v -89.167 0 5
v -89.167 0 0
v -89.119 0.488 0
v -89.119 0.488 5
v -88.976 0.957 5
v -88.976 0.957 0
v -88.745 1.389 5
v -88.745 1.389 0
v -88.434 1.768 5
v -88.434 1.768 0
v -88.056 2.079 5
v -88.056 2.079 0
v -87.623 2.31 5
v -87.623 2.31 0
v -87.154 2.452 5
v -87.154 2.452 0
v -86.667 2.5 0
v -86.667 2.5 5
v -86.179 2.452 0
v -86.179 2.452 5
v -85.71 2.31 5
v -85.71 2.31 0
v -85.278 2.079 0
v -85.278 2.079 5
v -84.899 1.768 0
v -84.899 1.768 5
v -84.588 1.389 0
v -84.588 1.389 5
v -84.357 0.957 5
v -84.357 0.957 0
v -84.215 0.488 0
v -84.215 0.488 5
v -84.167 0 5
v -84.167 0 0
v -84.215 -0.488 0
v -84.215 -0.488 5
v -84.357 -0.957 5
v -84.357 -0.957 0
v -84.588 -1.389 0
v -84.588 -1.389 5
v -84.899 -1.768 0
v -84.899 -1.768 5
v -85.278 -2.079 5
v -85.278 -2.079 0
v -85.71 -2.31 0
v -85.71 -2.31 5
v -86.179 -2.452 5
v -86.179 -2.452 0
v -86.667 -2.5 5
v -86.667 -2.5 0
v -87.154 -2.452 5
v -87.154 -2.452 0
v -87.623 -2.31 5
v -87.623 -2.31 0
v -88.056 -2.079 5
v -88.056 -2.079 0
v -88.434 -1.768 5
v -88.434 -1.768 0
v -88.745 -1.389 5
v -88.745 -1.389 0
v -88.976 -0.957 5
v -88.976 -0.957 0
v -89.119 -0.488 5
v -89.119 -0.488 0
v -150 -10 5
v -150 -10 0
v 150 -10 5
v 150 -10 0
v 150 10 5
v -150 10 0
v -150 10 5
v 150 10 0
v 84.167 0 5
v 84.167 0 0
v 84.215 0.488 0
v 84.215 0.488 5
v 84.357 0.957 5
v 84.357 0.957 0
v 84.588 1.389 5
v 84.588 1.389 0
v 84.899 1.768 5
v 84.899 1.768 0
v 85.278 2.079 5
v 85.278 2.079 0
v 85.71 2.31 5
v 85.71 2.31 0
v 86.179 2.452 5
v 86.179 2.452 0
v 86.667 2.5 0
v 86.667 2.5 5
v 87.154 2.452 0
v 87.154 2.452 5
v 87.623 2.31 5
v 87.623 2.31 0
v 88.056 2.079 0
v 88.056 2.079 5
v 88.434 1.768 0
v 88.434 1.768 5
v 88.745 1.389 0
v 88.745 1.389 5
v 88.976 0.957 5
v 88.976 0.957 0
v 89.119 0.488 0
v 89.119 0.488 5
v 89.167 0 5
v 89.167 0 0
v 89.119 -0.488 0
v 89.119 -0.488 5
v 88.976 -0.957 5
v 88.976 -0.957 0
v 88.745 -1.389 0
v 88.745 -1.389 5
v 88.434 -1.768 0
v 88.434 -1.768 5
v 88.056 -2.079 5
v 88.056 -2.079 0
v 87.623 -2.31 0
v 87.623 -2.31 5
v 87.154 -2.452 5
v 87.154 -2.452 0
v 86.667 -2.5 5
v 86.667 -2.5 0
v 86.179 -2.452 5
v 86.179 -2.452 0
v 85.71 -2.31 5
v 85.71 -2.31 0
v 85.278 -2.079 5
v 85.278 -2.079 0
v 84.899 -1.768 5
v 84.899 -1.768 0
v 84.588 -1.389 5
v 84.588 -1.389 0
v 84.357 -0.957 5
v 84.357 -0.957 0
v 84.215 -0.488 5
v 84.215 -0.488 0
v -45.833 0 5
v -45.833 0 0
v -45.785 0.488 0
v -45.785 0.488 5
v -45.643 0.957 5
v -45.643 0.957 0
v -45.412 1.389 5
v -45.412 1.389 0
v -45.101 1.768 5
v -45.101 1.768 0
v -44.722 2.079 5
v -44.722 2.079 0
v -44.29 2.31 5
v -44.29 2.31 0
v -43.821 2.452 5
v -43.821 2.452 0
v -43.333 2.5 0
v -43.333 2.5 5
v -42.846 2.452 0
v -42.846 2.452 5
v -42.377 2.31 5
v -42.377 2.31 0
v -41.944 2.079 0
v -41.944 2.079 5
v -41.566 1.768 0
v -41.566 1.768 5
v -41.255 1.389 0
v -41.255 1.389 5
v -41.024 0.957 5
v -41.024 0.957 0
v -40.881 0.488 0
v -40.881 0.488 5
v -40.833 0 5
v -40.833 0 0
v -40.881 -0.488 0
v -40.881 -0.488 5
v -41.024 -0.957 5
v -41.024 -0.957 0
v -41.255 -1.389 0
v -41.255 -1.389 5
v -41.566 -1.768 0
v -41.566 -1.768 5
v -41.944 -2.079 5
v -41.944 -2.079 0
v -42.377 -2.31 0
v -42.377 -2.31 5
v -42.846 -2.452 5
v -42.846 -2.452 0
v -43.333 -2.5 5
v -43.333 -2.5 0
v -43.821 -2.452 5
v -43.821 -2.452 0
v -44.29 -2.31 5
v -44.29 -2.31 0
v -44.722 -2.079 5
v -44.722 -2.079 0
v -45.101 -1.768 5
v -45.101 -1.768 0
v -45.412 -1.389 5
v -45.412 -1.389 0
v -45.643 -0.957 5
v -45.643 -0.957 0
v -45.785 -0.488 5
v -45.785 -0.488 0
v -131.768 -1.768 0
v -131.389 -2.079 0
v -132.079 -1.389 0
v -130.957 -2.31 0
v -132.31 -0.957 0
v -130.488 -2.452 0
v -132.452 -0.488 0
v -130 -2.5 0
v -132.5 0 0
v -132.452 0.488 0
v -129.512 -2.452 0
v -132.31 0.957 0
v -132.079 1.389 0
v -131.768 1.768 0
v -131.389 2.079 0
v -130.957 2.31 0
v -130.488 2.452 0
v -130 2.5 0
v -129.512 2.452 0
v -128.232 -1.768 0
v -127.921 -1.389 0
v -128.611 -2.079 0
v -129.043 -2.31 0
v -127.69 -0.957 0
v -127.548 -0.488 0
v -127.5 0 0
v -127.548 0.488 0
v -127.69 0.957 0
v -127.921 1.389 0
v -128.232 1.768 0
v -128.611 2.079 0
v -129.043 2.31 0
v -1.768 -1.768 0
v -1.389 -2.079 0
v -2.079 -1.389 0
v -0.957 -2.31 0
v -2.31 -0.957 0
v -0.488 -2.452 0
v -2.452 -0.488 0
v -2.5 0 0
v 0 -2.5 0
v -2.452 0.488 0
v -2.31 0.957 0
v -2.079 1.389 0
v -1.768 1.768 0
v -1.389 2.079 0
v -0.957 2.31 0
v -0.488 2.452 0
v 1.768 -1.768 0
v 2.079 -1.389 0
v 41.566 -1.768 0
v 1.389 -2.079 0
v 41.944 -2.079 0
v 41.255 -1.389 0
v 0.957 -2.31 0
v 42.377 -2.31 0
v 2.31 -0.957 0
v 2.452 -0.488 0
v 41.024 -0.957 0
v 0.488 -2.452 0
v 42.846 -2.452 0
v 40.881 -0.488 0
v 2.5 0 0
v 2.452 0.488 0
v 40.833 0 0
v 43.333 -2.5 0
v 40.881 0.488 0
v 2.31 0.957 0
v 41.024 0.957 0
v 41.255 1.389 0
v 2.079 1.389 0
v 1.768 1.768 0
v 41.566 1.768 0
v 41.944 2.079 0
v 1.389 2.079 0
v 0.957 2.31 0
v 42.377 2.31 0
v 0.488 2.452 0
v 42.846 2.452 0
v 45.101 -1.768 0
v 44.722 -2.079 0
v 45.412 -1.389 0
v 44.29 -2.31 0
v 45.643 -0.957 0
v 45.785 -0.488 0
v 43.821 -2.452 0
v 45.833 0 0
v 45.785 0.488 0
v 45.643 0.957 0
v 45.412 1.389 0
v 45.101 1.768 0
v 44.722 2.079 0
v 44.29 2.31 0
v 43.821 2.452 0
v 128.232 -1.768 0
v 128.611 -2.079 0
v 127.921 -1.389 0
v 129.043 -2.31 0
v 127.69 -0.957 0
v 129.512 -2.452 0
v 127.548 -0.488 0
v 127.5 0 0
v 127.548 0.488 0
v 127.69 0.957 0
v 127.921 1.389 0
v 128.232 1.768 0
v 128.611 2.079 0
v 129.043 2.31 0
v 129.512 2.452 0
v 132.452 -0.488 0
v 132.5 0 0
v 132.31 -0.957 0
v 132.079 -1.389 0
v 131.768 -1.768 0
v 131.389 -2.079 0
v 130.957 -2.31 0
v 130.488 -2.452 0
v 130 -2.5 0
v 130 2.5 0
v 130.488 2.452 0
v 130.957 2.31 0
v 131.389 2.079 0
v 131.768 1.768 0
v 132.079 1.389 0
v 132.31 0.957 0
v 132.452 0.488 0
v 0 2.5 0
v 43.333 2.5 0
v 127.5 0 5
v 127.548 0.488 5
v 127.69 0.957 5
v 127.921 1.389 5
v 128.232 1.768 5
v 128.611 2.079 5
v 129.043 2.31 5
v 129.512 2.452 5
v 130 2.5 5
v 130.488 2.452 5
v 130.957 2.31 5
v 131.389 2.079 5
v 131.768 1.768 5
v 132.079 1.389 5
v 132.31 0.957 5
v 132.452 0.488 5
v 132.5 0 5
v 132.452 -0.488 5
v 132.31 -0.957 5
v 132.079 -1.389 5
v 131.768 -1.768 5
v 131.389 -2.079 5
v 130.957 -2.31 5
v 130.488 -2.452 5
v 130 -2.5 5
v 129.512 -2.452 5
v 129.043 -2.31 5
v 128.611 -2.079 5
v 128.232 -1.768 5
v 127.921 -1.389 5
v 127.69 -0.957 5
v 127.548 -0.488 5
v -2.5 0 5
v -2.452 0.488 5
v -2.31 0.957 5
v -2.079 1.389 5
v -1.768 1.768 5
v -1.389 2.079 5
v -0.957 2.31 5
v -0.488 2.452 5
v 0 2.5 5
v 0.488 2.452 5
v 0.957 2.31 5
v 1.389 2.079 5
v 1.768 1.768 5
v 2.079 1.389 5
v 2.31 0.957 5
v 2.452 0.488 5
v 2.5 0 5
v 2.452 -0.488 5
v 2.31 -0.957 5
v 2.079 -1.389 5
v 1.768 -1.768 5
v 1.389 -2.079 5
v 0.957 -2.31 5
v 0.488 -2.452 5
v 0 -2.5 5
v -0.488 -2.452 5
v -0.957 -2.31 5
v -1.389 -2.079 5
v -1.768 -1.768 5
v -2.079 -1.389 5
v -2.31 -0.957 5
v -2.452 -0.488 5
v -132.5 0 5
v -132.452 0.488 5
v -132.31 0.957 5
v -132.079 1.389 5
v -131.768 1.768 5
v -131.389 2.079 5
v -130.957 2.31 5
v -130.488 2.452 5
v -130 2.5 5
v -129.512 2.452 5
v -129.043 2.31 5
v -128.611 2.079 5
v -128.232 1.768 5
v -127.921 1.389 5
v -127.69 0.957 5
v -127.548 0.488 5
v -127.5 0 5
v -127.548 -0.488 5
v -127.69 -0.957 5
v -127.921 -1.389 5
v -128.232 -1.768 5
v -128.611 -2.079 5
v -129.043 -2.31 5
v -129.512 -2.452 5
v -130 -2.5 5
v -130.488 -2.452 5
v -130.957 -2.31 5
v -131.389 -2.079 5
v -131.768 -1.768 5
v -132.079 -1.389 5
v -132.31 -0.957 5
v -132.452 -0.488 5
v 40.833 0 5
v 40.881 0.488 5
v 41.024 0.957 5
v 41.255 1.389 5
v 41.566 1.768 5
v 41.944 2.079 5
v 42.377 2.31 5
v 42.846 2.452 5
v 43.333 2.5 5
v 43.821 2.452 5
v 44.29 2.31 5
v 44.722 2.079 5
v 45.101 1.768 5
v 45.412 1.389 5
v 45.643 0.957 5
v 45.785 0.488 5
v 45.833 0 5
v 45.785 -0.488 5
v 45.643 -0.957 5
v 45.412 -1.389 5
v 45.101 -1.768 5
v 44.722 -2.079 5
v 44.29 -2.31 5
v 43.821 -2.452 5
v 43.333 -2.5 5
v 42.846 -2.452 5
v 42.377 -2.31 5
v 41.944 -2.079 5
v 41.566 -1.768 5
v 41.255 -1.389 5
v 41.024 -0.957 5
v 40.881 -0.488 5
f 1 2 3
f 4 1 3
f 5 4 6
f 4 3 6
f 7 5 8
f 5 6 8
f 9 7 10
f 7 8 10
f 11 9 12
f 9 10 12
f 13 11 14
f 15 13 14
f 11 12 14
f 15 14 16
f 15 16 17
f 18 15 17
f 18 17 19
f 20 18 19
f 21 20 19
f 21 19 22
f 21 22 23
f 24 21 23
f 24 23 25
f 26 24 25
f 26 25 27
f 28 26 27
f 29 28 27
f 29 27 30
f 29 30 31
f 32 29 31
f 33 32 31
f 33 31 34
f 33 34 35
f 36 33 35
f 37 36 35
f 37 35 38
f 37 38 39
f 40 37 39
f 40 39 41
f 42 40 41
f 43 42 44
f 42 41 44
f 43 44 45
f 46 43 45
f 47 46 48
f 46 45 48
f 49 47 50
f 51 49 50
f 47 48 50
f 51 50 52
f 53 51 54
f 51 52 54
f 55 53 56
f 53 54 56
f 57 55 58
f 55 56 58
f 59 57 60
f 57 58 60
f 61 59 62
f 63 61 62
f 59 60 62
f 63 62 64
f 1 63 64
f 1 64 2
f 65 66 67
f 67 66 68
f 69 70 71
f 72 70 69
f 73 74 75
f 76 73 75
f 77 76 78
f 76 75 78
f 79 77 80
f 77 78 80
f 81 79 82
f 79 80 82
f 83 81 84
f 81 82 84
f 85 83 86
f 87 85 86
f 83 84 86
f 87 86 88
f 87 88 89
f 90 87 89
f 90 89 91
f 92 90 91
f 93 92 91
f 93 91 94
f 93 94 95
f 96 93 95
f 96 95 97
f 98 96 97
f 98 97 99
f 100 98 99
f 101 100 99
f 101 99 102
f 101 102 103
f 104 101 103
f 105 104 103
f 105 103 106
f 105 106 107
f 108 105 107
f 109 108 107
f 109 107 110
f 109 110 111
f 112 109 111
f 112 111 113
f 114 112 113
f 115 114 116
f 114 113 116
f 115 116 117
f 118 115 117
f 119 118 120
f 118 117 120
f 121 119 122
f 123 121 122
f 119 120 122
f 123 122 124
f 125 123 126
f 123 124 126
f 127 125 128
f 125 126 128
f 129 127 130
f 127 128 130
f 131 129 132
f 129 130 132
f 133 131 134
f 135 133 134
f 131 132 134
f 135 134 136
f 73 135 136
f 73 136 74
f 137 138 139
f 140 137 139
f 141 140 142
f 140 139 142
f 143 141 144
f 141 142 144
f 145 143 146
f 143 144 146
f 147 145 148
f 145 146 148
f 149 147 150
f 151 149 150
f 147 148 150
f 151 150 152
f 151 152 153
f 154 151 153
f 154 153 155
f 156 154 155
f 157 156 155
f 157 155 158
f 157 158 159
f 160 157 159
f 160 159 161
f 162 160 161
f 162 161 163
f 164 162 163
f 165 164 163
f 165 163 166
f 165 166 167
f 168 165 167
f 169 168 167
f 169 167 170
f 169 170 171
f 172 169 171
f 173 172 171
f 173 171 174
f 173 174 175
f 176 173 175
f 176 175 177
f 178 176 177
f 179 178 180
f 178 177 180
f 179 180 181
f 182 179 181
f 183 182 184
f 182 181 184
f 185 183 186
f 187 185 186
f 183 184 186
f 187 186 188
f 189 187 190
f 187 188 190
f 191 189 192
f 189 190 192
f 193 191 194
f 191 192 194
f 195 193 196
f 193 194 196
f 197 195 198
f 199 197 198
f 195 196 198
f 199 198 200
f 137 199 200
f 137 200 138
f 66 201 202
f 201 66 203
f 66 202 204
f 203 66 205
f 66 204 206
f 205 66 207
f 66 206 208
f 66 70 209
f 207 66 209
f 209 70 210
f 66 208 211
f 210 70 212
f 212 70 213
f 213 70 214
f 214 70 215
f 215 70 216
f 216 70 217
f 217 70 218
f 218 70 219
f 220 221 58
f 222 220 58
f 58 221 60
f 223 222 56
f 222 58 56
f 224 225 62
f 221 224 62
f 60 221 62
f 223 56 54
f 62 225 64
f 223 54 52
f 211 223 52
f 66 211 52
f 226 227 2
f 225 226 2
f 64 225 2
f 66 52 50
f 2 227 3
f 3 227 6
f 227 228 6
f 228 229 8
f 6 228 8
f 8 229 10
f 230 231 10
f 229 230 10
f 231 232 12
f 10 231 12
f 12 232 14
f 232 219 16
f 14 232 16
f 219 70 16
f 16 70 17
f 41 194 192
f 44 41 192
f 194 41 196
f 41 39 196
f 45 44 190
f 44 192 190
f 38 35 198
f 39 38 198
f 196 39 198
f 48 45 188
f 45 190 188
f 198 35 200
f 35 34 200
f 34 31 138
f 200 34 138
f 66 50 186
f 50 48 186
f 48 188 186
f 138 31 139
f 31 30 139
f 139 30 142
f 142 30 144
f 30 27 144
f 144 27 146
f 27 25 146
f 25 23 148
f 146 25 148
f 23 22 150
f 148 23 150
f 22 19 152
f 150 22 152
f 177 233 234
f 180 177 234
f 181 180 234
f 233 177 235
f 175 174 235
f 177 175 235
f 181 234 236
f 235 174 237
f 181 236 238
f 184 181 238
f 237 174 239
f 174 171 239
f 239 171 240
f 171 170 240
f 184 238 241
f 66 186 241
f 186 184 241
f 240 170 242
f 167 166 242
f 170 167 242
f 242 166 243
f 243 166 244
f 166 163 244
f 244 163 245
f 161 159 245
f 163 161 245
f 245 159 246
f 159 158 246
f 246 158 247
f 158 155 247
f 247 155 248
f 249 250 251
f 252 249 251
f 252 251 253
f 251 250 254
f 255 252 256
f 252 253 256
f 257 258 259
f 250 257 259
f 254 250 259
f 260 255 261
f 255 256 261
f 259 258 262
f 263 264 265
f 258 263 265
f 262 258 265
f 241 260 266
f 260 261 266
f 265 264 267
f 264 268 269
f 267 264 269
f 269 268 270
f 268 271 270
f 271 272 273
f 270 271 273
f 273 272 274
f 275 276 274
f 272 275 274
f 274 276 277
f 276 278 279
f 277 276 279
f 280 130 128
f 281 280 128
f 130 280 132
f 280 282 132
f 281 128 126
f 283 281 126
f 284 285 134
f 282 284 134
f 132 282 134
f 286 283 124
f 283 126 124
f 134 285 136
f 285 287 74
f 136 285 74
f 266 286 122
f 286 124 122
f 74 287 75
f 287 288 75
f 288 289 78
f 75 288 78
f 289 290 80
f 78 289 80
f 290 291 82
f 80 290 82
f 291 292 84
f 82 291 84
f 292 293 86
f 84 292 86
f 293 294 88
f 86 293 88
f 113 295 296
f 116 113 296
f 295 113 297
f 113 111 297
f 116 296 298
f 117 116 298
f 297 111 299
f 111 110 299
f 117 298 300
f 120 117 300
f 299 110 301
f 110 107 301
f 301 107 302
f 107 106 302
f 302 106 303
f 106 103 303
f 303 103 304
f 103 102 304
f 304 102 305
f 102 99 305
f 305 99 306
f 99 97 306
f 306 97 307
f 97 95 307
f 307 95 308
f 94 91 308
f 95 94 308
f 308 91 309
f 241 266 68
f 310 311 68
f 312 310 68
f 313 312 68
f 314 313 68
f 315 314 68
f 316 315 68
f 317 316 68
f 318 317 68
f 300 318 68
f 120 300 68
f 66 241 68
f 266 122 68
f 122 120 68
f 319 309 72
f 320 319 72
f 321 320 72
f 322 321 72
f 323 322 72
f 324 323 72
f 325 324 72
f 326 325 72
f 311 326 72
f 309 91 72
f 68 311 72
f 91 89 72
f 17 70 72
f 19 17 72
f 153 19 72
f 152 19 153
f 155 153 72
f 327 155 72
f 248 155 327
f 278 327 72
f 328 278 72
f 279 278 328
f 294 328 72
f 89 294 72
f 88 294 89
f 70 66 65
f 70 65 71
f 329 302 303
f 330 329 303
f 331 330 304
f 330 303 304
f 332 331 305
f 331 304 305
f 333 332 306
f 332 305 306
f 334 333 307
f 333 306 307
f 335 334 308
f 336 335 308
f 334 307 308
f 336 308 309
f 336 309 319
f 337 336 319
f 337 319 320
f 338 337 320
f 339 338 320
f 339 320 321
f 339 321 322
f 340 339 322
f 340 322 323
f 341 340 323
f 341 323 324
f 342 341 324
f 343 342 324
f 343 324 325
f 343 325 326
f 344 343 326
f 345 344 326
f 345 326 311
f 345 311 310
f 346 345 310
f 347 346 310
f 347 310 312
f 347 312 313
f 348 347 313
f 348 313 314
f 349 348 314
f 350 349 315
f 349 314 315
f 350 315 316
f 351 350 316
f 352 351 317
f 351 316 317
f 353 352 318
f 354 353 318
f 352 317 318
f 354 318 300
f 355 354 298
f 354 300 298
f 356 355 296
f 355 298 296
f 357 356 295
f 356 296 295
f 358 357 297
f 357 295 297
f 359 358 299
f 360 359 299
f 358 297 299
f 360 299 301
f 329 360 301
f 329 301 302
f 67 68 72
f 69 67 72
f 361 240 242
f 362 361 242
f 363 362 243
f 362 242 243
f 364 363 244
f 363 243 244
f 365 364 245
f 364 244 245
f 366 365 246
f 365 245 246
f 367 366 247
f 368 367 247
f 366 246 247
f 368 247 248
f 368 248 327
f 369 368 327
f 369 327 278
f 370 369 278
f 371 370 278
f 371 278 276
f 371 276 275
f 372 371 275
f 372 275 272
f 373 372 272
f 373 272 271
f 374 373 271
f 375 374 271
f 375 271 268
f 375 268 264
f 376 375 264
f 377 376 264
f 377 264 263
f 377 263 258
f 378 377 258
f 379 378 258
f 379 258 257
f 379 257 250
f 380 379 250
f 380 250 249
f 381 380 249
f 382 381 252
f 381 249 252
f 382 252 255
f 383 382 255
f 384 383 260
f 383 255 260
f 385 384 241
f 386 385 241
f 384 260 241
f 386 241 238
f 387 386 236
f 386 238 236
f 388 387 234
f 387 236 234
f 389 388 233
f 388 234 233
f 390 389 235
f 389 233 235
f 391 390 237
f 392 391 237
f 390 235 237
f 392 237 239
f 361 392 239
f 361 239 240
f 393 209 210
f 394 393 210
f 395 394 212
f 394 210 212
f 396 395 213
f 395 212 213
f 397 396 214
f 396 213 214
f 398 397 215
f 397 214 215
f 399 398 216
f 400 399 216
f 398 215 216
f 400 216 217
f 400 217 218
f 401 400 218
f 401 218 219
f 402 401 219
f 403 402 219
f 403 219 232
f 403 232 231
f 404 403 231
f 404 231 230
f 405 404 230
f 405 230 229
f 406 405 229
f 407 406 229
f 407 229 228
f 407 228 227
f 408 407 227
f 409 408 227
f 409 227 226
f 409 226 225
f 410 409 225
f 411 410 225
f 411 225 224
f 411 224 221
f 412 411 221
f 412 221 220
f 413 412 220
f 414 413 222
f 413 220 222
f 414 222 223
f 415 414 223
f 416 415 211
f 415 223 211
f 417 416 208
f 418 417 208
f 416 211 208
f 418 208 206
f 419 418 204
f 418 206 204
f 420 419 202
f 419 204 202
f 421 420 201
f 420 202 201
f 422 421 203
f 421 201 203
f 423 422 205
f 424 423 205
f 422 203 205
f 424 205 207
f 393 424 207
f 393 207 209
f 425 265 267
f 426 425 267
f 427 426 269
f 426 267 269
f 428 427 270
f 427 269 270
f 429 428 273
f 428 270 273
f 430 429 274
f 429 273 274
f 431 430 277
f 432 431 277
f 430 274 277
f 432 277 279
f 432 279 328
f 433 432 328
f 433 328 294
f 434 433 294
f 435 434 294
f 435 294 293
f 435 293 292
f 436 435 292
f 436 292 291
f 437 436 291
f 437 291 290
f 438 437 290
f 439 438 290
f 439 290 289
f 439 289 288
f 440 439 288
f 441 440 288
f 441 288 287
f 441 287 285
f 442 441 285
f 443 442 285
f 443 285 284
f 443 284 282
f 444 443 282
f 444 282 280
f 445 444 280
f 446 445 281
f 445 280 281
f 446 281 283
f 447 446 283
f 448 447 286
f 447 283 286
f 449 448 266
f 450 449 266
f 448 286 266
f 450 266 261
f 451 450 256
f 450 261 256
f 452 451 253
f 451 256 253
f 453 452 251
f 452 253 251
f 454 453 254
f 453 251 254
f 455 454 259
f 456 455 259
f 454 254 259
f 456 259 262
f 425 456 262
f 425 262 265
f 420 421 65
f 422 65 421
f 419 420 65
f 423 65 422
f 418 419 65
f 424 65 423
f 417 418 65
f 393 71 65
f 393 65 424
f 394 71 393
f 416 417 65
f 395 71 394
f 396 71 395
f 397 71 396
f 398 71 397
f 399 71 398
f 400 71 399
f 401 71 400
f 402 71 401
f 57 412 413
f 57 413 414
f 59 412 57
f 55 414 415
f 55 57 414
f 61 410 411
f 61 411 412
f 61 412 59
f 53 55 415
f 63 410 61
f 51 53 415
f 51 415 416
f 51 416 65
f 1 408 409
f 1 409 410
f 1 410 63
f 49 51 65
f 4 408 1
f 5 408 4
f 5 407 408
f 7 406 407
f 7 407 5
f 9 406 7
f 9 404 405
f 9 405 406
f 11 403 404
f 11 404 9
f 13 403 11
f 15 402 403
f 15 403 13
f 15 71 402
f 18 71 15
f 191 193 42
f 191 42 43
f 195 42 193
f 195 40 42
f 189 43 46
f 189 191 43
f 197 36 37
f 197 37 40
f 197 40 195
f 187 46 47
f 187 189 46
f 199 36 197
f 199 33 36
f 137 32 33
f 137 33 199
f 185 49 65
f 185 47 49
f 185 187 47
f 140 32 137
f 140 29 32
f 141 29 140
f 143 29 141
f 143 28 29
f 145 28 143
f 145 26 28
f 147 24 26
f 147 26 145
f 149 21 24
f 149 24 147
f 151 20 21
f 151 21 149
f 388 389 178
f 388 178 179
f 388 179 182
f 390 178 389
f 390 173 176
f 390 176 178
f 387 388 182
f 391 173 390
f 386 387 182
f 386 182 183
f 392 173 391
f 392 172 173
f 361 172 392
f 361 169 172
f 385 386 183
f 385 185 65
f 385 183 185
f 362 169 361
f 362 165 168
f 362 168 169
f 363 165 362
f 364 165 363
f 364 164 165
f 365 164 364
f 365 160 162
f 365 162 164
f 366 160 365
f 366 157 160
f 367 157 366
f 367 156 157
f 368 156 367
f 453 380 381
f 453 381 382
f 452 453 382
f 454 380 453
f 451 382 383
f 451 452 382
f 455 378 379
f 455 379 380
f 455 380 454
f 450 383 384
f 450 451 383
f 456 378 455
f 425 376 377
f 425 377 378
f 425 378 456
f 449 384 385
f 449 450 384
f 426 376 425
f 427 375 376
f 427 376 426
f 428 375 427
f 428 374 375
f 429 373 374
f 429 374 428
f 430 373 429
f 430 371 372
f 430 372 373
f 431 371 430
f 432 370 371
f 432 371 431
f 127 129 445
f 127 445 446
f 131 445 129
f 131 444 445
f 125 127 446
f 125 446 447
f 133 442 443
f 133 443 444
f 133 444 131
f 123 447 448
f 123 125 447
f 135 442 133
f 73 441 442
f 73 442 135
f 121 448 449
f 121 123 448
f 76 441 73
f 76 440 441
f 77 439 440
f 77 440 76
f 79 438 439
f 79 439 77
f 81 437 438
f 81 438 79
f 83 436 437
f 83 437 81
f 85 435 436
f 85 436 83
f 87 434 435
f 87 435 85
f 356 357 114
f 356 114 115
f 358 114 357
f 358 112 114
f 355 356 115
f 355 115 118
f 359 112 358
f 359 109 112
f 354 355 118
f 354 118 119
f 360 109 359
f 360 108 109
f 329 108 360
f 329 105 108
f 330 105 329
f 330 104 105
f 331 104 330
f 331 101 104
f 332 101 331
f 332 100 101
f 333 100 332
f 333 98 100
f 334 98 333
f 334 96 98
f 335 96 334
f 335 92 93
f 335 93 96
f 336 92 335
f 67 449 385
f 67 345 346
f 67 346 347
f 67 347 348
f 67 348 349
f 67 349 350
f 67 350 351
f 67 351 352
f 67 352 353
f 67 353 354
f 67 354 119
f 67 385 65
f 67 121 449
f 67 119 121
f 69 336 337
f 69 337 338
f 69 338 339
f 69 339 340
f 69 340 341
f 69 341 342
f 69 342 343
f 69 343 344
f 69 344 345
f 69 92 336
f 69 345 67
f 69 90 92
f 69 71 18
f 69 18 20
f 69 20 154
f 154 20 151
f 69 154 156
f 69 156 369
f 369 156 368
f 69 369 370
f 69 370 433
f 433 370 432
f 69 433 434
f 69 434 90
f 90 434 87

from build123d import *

# Parameters (mm, degrees)
SKICA1_W                = 300
SKICA1_H                = 20
P_IDAT_VYSUNUT_M1_DEPTH = 5
F_5_0_5_PR_M_R_D_RY1_D  = 5
F_5_0_5_PR_M_R_D_RY2_D  = 5
LINPOLE1_COUNT          = 6
LINPOLE1_PITCH          = 43.333333333


with BuildPart() as part:
    # Skica1 → Přidat vysunutím1 (new body)
    with BuildSketch(Plane.XY):
        Rectangle(SKICA1_W, SKICA1_H)
    extrude(amount=P_IDAT_VYSUNUT_M1_DEPTH)

    # Ø5.0 (5) průměr díry1 (through all)
    with Locations(Plane.XY.offset(5)):
        with Locations((-130, 0)):
            f_5_0_5_pr_m_r_d_ry1 = Hole(F_5_0_5_PR_M_R_D_RY1_D / 2)

    # Ø5.0 (5) průměr díry2 (through all)
    with Locations(Plane.XY.offset(5)):
        with Locations((130, 0)):
            Hole(F_5_0_5_PR_M_R_D_RY2_D / 2)

    # LinPole1: Ø5.0 (5) průměr díry1 ×6
    with Locations(*[(i * LINPOLE1_PITCH, 0, 0) for i in range(1, LINPOLE1_COUNT)]):
        add(f_5_0_5_pr_m_r_d_ry1, mode=Mode.SUBTRACT)


solid = part.part
